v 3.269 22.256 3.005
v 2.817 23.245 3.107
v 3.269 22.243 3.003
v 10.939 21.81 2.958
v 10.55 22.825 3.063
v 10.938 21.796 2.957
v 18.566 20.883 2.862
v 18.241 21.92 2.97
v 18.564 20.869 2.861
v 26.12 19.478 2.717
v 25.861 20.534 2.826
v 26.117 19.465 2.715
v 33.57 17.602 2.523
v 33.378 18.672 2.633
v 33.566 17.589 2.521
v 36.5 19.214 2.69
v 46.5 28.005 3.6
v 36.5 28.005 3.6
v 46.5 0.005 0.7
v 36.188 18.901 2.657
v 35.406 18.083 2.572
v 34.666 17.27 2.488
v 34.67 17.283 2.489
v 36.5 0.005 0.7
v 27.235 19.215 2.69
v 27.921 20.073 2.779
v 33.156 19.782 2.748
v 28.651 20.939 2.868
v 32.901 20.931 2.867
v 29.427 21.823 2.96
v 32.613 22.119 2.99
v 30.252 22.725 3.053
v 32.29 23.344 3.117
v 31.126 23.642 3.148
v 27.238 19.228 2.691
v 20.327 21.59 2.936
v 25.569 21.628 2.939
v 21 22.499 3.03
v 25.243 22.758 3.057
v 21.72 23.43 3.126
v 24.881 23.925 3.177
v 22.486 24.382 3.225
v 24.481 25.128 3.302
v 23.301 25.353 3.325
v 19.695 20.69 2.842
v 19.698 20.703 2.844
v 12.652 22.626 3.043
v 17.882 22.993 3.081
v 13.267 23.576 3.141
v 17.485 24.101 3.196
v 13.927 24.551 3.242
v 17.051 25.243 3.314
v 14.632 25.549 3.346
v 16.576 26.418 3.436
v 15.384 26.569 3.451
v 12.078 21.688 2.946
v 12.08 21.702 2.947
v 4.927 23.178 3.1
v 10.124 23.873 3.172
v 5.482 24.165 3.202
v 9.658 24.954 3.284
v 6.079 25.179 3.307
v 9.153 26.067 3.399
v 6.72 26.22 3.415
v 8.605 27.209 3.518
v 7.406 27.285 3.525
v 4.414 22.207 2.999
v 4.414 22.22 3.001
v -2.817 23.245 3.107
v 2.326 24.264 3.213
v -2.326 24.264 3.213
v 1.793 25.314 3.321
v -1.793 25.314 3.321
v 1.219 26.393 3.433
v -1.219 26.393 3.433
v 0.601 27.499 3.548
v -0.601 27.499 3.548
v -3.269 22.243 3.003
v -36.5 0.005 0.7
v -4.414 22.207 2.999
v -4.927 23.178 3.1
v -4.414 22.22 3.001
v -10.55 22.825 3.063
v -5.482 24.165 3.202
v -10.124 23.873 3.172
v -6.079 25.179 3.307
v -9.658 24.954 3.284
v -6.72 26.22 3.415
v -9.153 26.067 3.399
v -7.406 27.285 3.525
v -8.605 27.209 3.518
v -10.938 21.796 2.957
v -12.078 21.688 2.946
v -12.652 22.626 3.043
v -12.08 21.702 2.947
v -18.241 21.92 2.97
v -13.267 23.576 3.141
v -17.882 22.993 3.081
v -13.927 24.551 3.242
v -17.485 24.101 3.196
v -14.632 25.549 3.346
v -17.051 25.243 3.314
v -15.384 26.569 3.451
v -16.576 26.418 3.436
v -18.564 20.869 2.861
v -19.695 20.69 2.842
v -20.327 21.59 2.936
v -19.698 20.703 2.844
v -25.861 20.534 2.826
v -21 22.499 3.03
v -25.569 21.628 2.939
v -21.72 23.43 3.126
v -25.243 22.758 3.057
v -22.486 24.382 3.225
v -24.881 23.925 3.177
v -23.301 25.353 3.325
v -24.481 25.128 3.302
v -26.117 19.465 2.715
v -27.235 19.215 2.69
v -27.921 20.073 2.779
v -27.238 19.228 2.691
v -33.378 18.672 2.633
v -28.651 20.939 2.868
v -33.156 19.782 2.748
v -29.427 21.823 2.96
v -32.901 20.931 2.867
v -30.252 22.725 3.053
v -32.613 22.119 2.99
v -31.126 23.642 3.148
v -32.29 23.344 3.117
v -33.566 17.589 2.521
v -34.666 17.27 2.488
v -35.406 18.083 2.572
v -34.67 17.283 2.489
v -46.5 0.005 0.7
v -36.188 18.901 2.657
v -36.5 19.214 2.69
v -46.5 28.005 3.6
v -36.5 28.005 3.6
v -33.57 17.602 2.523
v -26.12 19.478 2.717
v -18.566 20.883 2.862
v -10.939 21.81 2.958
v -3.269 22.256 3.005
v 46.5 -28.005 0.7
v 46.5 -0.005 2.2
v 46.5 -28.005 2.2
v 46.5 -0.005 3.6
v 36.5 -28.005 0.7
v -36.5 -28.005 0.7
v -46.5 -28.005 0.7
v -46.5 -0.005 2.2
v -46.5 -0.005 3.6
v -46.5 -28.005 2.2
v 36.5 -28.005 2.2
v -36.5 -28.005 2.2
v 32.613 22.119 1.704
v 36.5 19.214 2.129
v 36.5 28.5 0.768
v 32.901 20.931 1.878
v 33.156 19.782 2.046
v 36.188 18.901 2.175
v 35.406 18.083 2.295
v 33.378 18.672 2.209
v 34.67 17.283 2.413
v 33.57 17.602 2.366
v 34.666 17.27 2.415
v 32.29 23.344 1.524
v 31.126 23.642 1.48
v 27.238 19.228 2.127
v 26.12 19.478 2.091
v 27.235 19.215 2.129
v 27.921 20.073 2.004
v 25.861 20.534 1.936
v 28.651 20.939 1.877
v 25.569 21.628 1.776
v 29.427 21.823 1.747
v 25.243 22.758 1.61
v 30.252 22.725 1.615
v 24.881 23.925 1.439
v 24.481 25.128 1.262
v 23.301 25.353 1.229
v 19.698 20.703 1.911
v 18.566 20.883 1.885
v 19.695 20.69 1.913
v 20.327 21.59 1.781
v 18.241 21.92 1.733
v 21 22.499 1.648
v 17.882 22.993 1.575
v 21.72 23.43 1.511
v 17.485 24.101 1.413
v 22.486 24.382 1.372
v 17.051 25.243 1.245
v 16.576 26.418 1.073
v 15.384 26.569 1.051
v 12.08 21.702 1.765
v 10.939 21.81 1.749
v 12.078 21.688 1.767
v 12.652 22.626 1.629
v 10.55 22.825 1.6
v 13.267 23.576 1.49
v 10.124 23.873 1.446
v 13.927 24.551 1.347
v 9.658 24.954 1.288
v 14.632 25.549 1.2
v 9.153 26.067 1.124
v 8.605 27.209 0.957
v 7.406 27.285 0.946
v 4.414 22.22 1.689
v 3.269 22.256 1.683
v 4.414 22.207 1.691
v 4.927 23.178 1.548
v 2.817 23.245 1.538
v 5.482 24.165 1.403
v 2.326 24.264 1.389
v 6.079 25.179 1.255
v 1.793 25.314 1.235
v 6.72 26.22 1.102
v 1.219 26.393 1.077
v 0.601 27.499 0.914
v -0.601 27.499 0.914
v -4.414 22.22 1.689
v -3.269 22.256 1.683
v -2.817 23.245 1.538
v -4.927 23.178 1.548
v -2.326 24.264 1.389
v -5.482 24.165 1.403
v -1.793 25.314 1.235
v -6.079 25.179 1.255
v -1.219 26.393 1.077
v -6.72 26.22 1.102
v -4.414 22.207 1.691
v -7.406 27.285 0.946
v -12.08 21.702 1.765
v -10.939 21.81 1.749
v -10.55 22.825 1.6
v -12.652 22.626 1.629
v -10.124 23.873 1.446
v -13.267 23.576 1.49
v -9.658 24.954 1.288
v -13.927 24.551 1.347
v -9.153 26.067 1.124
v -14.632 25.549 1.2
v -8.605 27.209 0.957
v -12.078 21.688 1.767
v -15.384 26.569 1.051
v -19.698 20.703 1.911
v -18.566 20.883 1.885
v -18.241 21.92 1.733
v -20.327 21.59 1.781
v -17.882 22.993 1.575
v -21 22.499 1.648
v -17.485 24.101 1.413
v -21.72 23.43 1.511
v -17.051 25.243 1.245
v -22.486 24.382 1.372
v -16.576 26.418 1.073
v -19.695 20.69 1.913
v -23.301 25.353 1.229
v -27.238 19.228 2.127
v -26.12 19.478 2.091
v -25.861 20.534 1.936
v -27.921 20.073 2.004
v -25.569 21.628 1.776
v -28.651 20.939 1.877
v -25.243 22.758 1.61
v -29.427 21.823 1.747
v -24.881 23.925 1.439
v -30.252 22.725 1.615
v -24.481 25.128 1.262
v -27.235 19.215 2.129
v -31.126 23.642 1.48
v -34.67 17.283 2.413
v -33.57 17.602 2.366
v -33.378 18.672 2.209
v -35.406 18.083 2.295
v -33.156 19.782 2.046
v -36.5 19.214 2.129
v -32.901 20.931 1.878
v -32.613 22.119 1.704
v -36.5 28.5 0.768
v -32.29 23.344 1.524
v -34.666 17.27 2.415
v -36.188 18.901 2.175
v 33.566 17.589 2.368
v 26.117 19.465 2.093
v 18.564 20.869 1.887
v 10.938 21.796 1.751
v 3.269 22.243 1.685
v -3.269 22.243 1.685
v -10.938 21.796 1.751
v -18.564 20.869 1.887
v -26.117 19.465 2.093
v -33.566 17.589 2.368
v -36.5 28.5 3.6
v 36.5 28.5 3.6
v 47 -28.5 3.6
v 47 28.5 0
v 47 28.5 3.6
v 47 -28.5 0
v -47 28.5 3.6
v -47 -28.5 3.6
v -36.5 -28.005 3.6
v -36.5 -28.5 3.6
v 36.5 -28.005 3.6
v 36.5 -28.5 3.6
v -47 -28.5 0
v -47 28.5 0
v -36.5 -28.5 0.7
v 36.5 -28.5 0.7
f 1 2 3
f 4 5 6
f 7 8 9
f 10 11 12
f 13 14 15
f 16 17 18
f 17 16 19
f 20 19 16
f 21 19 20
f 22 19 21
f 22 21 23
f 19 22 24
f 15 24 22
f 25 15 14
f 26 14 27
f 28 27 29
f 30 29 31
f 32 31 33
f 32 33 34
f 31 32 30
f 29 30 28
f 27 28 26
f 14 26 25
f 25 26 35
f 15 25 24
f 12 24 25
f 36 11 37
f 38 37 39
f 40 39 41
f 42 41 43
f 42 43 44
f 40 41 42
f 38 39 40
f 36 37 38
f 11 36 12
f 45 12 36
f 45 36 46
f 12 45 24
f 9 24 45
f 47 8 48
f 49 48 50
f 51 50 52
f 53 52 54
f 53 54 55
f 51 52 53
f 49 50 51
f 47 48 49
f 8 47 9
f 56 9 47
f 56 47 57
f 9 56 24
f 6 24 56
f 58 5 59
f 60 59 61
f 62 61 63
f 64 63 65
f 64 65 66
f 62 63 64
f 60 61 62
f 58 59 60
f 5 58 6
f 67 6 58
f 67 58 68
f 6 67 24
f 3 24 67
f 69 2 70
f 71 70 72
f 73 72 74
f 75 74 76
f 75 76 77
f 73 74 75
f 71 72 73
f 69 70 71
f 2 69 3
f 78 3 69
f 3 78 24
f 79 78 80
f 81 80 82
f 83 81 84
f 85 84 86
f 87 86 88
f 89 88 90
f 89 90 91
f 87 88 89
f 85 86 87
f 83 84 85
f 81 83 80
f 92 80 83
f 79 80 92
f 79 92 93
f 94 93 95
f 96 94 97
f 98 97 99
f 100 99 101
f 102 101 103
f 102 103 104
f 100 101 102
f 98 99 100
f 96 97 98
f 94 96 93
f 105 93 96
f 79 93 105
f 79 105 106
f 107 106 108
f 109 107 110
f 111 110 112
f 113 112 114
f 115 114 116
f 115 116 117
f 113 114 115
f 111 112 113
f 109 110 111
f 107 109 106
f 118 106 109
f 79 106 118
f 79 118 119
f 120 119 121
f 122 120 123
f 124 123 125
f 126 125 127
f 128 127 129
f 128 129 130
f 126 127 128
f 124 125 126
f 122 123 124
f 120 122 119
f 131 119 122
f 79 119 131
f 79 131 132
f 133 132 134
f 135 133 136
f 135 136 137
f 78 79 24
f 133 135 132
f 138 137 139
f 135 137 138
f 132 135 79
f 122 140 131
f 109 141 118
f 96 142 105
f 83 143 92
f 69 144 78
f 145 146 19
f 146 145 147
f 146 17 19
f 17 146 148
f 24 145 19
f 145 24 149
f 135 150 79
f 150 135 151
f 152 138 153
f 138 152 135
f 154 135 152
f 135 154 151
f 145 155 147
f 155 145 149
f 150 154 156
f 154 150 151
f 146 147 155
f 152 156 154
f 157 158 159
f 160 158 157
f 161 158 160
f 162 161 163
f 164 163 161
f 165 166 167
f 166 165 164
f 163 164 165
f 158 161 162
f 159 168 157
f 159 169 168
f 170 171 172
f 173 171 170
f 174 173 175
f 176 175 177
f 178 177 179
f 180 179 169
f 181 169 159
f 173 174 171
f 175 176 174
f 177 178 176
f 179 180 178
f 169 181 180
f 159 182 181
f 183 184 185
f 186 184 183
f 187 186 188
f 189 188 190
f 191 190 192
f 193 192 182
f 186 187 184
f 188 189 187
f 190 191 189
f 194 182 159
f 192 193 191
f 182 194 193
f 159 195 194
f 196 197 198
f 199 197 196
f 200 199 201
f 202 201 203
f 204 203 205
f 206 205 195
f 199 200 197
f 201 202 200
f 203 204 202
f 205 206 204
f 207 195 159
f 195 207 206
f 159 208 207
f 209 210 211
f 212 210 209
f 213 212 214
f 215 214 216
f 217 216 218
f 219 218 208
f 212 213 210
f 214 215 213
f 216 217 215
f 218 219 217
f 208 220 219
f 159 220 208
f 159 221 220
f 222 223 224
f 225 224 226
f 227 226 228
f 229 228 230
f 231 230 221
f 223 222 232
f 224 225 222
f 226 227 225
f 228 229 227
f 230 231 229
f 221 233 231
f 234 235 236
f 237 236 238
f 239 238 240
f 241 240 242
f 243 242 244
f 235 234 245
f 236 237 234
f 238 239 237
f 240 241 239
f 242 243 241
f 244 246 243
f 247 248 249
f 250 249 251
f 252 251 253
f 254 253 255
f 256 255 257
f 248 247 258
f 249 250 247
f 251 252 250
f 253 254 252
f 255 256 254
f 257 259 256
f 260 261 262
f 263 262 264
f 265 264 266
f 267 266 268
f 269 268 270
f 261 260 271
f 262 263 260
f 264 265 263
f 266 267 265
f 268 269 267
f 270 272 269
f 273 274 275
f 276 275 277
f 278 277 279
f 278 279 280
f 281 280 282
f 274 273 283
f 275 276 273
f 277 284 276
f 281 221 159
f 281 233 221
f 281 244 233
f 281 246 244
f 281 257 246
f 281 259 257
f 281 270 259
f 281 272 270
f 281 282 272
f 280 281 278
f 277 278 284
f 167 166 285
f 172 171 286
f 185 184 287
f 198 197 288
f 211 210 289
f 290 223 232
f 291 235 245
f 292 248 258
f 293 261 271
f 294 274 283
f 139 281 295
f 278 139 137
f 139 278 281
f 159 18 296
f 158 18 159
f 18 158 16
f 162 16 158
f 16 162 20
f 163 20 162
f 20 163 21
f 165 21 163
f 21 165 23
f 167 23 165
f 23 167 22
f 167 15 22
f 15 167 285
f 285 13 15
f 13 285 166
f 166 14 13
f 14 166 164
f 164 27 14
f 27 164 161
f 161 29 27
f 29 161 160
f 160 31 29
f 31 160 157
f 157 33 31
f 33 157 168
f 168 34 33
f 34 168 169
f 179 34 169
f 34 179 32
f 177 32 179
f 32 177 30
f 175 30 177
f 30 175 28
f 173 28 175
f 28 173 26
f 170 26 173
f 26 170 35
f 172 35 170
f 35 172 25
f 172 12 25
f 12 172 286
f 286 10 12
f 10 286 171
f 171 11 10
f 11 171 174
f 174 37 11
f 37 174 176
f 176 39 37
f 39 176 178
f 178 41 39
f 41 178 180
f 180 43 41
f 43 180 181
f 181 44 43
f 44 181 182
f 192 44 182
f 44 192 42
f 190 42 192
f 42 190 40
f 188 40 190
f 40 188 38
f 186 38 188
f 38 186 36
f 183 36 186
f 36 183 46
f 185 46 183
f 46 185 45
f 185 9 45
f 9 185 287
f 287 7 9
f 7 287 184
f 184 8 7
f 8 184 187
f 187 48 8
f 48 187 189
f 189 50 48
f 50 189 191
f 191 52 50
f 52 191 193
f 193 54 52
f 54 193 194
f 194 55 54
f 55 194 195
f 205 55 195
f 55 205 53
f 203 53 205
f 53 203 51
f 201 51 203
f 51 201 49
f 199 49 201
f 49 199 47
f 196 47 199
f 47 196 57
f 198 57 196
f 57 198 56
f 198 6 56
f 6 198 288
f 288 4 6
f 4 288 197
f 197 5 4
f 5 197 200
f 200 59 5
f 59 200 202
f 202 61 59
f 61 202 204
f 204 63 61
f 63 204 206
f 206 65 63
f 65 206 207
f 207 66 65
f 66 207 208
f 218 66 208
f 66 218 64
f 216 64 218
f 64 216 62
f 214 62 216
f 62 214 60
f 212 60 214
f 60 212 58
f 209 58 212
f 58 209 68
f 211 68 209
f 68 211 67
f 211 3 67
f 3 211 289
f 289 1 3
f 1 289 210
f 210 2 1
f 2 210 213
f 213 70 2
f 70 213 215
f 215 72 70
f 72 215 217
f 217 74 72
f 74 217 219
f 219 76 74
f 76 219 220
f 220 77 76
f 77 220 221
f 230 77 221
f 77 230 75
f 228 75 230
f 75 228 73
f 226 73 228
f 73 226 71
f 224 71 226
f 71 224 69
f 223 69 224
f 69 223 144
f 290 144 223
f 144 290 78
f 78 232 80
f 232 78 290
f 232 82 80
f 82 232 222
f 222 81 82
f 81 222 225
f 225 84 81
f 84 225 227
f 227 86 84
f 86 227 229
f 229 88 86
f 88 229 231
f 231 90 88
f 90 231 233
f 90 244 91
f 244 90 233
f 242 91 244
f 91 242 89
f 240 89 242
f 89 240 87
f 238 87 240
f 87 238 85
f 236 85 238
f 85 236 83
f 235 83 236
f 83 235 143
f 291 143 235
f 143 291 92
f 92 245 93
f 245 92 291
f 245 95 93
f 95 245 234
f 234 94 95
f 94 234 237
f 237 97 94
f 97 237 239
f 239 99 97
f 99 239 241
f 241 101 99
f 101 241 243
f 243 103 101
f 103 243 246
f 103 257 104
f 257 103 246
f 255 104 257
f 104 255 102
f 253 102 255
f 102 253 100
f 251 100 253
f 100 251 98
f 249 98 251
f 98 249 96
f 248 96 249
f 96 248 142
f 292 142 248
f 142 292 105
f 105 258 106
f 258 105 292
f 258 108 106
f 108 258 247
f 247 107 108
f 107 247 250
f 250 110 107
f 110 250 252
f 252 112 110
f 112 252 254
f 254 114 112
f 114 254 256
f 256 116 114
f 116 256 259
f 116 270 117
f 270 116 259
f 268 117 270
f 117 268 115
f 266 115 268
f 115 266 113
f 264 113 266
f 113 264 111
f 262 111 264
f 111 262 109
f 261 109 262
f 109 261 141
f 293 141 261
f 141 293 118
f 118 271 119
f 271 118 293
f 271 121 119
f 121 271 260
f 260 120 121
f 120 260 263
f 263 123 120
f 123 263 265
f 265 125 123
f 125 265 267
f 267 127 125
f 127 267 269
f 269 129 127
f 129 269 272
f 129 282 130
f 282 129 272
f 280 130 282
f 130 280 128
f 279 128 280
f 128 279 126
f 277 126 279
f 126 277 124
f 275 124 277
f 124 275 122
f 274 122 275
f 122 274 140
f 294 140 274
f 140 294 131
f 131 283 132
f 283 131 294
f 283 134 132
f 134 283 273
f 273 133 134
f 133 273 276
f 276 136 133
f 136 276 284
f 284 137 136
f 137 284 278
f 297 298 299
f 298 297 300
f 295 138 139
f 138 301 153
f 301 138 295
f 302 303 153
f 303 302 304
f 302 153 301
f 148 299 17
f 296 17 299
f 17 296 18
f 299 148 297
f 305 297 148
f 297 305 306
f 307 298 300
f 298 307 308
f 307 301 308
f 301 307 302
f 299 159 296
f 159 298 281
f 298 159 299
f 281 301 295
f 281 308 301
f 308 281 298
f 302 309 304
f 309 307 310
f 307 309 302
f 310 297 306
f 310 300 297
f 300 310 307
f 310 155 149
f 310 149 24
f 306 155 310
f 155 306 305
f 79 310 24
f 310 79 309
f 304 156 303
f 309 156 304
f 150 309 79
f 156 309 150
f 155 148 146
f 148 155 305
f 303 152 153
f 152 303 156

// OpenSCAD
// Wall Mounted Single Card Holder
// By Brian Khuu 2022-04-10
// RevB is specifically for Alexar's request for gear style slopes
use <MCAD/involute_gears.scad>
use <MCAD/regular_shapes.scad>

print_layer_height = 0.2;

// Businesscard
// Default values based on https://www.mbe.com.au/what-is-the-standard-business-card-size-in-australia/
businesscard_width = 93; // 90mm but some in real life are more like 91mm (Plus 0.5 tol )
businesscard_height = 56; // 55mm (add 0.5mm tol)
businesscard_thickness = 1.5; // 0.25mm for thin paper cards. 0.8mm for thick plastic cards. We need to add extra thickness to account for layer droop

// Holder
wall_spacing = 1;
wall_card_grip = 20;
wall_x_count = 1; //2
wall_y_count = 1; //3

// Calc
wall_base = print_layer_height*3+0.1;
wall_top = print_layer_height*3+0.1;
wall_height = wall_base + businesscard_thickness + wall_top*2;

module simple_gear (
	number_of_teeth=15,
	circular_pitch=false, diametral_pitch=false,
	pressure_angle=28,
	clearance = 0.2,
	backlash=0,
	twist=0,
	involute_facets=0,
	flat=false)
{
    pi=3.1415926535897932384626433832795;
    
	if (circular_pitch==false && diametral_pitch==false)
		echo("MCAD ERROR: gear module needs either a diametral_pitch or circular_pitch");

	//Convert diametrial pitch to our native circular pitch
	circular_pitch = (circular_pitch!=false?circular_pitch:180/diametral_pitch);

	// Pitch diameter: Diameter of pitch circle.
	pitch_diameter  =  number_of_teeth * circular_pitch / 180;
	pitch_radius = pitch_diameter/2;
	echo ("Teeth:", number_of_teeth, " Pitch radius:", pitch_radius);

	// Base Circle
	base_radius = pitch_radius*cos(pressure_angle);

	// Diametrial pitch: Number of teeth per unit length.
	pitch_diametrial = number_of_teeth / pitch_diameter;

	// Addendum: Radial distance from pitch circle to outside circle.
	addendum = 1/pitch_diametrial;

	//Outer Circle
	outer_radius = pitch_radius+addendum;

	// Dedendum: Radial distance from pitch circle to root diameter
	dedendum = addendum + clearance;

	// Root diameter: Diameter of bottom of tooth spaces.
	root_radius = pitch_radius-dedendum;
	backlash_angle = backlash / pitch_radius * 180 / pi;
	half_thick_angle = (360 / number_of_teeth - backlash_angle) / 4;


    linear_exturde_flat_option(flat=flat, height=rim_thickness, convexity=10, twist=twist)
    gear_shape (
        number_of_teeth,
        pitch_radius = pitch_radius,
        root_radius = root_radius,
        base_radius = base_radius,
        outer_radius = outer_radius,
        half_thick_angle = half_thick_angle,
        involute_facets=involute_facets);
}

module cardSlopeOutline()
{
    hull()
    {
        translate([0,businesscard_height/2+1, wall_base])
        cube([businesscard_width-wall_card_grip, 0.01, 0.01], center = true);
        translate([0,businesscard_height/4,businesscard_thickness + wall_top*2])
        cube([businesscard_width-wall_card_grip, 0.01, 0.01], center = true);
    }
}

module cardWindowOutline()
{
    hull()
    {
        translate([0,businesscard_height/2,businesscard_thickness + wall_top*2])
        cube([businesscard_width, 0.01, 0.01], center = true);
        translate([0,0,0])
        cube([businesscard_width, 0.01, 0.01], center = true);
    }    
    hull()
    {
        translate([0,0,businesscard_thickness + wall_top*2])
        cube([businesscard_width, 0.01, 0.01], center = true);
        translate([0,-businesscard_height/2,0])
        cube([businesscard_width-wall_card_grip, 0.01, 0.01], center = true);
    }
}

module cardholder(reducePlastic=false)
{
    if (0)
    translate([0,0,wall_base+businesscard_thickness])
        rotate([2,0,0])
        %cube([85, 54, 0.1], center = true);

    difference()
    {
        translate([0,0,wall_height/2])
            cube([businesscard_width+wall_spacing, businesscard_height+wall_spacing, wall_height], center = true);
        
        // Card Slide
        translate([0,0,wall_base])
        translate([0,0,businesscard_thickness/2])
        {
            // Upper
            hull()
            {
                translate([0,businesscard_height/2,businesscard_thickness + wall_top*2])
                cube([businesscard_width, 0.01, businesscard_thickness], center = true);
                
                translate([0,0,0])
                cube([businesscard_width, 0.01, businesscard_thickness], center = true);
            }
            // Lower
            hull()
            {
                translate([0,-businesscard_height/2,0])
                cube([businesscard_width, 0.01, businesscard_thickness], center = true);
                cube([businesscard_width, 0.01, businesscard_thickness], center = true);
            }
        }
        
        // Grip
        translate([0,0,wall_height/2+wall_base])
            hull()
            {
                translate([0,0,0])
                cube([businesscard_width-wall_card_grip, 0.01, wall_height], center = true);
                
                translate([0,-businesscard_height,0])
                cube([businesscard_width-wall_card_grip, 0.01, wall_height], center = true);
            }
        
        
        // Card Window
        translate([0,0,wall_base+businesscard_thickness/2])
        {
            hull()
            {
                // Card Window Base
                cardWindowOutline();
                // Card Window Top
                translate([0,0,businesscard_thickness + wall_top * 2])
                    cardWindowOutline();
            }
        }
        
        // Card Slope
        difference()
        {
            translate([0,0,0])
            {
                hull()
                {
                    // Card Window Base
                    cardSlopeOutline();
                    // Card Window Top
                    translate([0,0,businesscard_thickness + wall_top * 2])
                        cardSlopeOutline();
                }
            }
            translate([0,-100,0])
                simple_gear(number_of_teeth=100, circular_pitch=450, rim_thickness = wall_height);
        }
        
        // Reduce Plastic
        if (reducePlastic)
        translate([0,0,wall_base+businesscard_thickness/2+0.5])
        {
            cube([businesscard_width-wall_card_grip,businesscard_height-10, wall_height+1], center=true);
        }
    }
}

if (wall_x_count == 1 && wall_y_count == 1)
{
    cardholder(false);
}
else
{
    for (x = [1: 1 : wall_x_count])
        for (y = [1 : 1 : wall_y_count])
           translate([x*(businesscard_width+wall_spacing), y*(businesscard_height+wall_spacing), 0])
                cardholder(false);
}
